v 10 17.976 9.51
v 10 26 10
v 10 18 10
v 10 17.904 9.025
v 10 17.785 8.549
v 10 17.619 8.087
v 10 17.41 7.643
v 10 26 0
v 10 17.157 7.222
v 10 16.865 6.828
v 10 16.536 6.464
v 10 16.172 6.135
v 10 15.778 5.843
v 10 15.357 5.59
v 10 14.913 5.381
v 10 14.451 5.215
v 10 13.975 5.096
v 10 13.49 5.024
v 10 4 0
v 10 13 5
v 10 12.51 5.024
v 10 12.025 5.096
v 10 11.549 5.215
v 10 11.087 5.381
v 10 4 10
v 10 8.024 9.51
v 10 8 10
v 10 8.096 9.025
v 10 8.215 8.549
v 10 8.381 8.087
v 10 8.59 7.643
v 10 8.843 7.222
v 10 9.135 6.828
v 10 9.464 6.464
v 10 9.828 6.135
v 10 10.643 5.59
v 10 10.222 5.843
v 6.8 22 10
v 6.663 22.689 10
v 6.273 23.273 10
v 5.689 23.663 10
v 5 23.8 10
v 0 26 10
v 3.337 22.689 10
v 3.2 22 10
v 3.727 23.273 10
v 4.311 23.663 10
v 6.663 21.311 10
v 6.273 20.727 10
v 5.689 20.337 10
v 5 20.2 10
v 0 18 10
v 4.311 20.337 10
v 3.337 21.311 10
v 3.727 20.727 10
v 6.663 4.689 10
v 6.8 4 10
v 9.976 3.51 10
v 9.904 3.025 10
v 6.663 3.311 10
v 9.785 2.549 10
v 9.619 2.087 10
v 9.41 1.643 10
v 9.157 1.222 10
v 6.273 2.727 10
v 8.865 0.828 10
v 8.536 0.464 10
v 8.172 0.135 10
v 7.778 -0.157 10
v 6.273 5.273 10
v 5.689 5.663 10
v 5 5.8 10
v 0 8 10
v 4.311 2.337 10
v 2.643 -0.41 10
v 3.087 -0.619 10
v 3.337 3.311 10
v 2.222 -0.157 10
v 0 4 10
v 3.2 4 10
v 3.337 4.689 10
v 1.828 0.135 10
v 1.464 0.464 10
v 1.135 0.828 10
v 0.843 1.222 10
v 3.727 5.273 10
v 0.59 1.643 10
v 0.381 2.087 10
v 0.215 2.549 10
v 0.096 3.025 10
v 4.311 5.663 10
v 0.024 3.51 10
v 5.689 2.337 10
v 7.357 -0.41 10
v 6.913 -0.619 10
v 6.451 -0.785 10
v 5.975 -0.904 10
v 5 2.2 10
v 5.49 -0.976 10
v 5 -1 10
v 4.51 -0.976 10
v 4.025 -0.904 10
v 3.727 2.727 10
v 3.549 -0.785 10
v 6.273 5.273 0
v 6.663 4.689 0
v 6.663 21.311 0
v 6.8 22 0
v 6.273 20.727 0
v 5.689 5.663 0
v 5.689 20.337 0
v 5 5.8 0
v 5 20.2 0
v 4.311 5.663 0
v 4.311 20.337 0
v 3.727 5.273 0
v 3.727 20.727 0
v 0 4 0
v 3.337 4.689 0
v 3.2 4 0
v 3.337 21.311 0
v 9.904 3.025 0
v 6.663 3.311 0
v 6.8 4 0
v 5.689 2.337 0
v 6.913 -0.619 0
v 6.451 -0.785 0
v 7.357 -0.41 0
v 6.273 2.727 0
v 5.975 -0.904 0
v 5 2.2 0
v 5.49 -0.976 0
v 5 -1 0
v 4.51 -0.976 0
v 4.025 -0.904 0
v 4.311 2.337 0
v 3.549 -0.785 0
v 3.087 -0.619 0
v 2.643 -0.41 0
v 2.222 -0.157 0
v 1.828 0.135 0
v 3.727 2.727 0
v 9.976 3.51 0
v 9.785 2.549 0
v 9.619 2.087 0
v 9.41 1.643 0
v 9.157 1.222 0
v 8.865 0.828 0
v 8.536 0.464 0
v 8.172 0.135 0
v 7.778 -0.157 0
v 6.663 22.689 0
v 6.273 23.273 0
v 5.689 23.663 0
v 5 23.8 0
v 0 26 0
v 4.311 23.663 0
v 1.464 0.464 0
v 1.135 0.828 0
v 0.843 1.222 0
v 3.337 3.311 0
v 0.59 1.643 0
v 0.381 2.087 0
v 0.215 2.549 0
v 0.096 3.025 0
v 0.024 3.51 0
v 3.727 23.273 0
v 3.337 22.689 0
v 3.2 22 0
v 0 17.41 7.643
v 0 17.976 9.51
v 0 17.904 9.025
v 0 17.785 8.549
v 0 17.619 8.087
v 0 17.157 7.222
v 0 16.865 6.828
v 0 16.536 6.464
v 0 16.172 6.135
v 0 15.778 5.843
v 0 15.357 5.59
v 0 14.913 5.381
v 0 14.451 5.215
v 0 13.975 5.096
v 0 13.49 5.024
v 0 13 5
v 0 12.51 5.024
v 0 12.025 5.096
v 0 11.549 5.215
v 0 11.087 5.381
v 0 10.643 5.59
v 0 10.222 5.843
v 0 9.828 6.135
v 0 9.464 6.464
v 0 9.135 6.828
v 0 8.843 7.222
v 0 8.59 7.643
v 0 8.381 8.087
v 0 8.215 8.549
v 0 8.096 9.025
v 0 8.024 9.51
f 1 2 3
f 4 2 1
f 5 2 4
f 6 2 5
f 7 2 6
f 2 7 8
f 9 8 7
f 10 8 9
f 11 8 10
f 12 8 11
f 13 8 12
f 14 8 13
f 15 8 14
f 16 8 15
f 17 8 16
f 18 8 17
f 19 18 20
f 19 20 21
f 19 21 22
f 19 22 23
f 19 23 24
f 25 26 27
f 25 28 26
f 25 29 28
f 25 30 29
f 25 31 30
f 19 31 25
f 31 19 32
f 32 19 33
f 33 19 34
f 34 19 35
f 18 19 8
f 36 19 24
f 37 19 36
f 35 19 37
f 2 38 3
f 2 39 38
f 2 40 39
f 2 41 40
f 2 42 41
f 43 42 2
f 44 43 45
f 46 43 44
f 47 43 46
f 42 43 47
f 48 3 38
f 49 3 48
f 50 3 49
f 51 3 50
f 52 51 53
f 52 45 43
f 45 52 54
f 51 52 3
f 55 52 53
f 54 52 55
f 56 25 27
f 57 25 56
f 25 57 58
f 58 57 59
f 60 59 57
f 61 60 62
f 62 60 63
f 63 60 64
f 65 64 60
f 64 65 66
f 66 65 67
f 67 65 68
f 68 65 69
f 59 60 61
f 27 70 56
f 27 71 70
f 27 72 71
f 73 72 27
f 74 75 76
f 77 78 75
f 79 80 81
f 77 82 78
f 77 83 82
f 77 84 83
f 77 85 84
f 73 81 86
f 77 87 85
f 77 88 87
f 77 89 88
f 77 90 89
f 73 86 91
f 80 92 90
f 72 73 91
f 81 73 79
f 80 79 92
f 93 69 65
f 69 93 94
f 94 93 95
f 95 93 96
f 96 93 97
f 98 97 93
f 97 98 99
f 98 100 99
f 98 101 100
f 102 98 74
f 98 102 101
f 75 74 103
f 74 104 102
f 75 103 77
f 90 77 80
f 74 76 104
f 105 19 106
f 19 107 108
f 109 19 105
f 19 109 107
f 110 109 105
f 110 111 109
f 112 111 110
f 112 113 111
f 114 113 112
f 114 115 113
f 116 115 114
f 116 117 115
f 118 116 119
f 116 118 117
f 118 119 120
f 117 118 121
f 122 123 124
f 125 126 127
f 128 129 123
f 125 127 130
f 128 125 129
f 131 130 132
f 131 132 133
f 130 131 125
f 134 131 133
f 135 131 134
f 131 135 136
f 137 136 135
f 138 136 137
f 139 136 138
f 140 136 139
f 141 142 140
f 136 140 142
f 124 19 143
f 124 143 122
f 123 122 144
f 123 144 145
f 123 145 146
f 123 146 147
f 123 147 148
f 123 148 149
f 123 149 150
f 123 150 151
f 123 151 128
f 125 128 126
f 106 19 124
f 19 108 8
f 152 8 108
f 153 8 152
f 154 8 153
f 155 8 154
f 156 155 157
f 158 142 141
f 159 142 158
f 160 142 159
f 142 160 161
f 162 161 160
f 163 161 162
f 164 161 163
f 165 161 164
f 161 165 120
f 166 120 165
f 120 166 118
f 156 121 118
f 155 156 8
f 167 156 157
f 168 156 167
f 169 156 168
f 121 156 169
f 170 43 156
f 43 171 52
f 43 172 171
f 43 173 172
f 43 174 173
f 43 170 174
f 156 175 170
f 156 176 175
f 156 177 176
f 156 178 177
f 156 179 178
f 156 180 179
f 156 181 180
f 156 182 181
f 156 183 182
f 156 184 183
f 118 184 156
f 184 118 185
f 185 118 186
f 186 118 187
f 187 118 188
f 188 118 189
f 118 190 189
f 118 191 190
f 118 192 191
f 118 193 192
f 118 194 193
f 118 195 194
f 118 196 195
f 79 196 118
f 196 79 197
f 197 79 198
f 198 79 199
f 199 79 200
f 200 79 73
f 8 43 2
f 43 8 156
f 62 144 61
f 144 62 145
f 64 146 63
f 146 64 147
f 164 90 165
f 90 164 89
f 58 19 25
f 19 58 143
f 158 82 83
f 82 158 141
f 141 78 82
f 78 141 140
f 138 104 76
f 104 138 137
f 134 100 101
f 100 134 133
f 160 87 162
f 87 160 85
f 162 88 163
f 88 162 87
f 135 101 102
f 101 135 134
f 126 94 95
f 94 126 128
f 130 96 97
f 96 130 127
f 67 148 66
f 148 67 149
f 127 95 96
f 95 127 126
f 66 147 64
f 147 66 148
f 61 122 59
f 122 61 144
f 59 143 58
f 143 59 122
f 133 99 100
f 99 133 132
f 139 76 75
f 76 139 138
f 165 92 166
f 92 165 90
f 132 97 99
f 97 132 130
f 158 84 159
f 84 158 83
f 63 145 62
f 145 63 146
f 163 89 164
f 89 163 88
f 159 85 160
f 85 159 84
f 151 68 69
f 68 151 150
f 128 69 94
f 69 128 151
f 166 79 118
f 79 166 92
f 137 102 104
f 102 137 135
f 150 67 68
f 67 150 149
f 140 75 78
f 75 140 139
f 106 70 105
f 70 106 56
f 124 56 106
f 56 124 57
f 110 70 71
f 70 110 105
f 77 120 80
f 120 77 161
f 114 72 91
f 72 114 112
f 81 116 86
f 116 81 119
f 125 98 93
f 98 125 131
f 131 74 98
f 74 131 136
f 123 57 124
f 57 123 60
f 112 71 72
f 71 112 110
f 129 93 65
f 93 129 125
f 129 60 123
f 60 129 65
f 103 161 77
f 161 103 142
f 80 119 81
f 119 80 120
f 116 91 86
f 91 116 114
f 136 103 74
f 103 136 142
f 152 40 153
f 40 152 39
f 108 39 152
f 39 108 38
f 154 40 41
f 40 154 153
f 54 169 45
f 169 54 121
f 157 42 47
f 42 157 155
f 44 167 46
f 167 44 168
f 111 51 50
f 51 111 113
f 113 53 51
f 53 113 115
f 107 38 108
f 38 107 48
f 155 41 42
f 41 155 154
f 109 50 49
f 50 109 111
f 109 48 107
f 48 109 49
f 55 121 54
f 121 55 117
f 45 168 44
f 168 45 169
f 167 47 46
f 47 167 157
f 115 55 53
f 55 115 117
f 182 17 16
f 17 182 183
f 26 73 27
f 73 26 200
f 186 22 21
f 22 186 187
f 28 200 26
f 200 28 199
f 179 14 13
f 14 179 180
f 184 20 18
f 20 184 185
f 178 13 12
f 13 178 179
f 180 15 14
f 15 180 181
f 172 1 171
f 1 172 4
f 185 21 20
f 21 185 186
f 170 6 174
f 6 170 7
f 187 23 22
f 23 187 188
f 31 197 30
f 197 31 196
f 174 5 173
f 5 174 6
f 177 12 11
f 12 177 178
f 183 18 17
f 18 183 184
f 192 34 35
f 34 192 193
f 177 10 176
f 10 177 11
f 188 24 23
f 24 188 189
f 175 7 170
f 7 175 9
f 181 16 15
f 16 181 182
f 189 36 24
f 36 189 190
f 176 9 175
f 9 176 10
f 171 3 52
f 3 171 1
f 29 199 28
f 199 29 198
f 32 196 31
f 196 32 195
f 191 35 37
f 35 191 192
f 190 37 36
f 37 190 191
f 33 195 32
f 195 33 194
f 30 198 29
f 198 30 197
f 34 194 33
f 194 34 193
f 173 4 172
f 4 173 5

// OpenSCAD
// file: SpotWelderControllerVars.scad
baseHeight=5;
pcbHeight=3;
holderWidth=10;

pcbLength=90;
pcbWidth=60;

thirdScrewHoleXOffset=7;
thirdScrewHoleYOffset=22;
thirdScrewHoleXPosition=pcbLength-thirdScrewHoleXOffset;

transformerHolderXOffset=15;
transformerScrewYOffset=6;

screwM3Diameter=3.6;
screwM3HolderDiameter=8;
screwM3HolderRadius=screwM3HolderDiameter/2;

nutM3Height=2.4;
nutM3ConeHeight=1.0;
nutM3Diameter=7;

thickWireDiameter=10;
thickWireHolderLength=thickWireDiameter+2*screwM3HolderDiameter;
thickWireHolderHeight=6+baseHeight;
thickWireHolderCoverHeight=10;

totalLength=pcbLength+transformerHolderXOffset+holderWidth;
totalWidth=pcbWidth+thickWireHolderLength;
// main file
include <SpotWelderControllerVars.scad>

module thickWireHolderScrewHoles()
{
	y1=screwM3HolderRadius;
	y2=thickWireHolderLength-screwM3HolderRadius;
	
	for(t=[y1,y2])
	{
		translate([holderWidth/2,t,-1])
		cylinder(d=screwM3Diameter,h=thickWireHolderCoverHeight+2,$fn=16);
	}
}

module thickWireHole()
{
	translate([-1,thickWireHolderLength/2,thickWireHolderCoverHeight])
	rotate([0,90,0])
	cylinder(d=thickWireDiameter,h=holderWidth+2,$fn=64);
}

difference()
{
	union()
	{
		translate([0,screwM3HolderRadius,0])
		cube([holderWidth,thickWireHolderLength-screwM3HolderRadius,thickWireHolderCoverHeight]);
		
		translate([holderWidth/2,screwM3HolderRadius,0])
		cylinder(d=holderWidth,h=thickWireHolderCoverHeight,$fn=64);
	}
	
	thickWireHolderScrewHoles();
	thickWireHole();
}
	
